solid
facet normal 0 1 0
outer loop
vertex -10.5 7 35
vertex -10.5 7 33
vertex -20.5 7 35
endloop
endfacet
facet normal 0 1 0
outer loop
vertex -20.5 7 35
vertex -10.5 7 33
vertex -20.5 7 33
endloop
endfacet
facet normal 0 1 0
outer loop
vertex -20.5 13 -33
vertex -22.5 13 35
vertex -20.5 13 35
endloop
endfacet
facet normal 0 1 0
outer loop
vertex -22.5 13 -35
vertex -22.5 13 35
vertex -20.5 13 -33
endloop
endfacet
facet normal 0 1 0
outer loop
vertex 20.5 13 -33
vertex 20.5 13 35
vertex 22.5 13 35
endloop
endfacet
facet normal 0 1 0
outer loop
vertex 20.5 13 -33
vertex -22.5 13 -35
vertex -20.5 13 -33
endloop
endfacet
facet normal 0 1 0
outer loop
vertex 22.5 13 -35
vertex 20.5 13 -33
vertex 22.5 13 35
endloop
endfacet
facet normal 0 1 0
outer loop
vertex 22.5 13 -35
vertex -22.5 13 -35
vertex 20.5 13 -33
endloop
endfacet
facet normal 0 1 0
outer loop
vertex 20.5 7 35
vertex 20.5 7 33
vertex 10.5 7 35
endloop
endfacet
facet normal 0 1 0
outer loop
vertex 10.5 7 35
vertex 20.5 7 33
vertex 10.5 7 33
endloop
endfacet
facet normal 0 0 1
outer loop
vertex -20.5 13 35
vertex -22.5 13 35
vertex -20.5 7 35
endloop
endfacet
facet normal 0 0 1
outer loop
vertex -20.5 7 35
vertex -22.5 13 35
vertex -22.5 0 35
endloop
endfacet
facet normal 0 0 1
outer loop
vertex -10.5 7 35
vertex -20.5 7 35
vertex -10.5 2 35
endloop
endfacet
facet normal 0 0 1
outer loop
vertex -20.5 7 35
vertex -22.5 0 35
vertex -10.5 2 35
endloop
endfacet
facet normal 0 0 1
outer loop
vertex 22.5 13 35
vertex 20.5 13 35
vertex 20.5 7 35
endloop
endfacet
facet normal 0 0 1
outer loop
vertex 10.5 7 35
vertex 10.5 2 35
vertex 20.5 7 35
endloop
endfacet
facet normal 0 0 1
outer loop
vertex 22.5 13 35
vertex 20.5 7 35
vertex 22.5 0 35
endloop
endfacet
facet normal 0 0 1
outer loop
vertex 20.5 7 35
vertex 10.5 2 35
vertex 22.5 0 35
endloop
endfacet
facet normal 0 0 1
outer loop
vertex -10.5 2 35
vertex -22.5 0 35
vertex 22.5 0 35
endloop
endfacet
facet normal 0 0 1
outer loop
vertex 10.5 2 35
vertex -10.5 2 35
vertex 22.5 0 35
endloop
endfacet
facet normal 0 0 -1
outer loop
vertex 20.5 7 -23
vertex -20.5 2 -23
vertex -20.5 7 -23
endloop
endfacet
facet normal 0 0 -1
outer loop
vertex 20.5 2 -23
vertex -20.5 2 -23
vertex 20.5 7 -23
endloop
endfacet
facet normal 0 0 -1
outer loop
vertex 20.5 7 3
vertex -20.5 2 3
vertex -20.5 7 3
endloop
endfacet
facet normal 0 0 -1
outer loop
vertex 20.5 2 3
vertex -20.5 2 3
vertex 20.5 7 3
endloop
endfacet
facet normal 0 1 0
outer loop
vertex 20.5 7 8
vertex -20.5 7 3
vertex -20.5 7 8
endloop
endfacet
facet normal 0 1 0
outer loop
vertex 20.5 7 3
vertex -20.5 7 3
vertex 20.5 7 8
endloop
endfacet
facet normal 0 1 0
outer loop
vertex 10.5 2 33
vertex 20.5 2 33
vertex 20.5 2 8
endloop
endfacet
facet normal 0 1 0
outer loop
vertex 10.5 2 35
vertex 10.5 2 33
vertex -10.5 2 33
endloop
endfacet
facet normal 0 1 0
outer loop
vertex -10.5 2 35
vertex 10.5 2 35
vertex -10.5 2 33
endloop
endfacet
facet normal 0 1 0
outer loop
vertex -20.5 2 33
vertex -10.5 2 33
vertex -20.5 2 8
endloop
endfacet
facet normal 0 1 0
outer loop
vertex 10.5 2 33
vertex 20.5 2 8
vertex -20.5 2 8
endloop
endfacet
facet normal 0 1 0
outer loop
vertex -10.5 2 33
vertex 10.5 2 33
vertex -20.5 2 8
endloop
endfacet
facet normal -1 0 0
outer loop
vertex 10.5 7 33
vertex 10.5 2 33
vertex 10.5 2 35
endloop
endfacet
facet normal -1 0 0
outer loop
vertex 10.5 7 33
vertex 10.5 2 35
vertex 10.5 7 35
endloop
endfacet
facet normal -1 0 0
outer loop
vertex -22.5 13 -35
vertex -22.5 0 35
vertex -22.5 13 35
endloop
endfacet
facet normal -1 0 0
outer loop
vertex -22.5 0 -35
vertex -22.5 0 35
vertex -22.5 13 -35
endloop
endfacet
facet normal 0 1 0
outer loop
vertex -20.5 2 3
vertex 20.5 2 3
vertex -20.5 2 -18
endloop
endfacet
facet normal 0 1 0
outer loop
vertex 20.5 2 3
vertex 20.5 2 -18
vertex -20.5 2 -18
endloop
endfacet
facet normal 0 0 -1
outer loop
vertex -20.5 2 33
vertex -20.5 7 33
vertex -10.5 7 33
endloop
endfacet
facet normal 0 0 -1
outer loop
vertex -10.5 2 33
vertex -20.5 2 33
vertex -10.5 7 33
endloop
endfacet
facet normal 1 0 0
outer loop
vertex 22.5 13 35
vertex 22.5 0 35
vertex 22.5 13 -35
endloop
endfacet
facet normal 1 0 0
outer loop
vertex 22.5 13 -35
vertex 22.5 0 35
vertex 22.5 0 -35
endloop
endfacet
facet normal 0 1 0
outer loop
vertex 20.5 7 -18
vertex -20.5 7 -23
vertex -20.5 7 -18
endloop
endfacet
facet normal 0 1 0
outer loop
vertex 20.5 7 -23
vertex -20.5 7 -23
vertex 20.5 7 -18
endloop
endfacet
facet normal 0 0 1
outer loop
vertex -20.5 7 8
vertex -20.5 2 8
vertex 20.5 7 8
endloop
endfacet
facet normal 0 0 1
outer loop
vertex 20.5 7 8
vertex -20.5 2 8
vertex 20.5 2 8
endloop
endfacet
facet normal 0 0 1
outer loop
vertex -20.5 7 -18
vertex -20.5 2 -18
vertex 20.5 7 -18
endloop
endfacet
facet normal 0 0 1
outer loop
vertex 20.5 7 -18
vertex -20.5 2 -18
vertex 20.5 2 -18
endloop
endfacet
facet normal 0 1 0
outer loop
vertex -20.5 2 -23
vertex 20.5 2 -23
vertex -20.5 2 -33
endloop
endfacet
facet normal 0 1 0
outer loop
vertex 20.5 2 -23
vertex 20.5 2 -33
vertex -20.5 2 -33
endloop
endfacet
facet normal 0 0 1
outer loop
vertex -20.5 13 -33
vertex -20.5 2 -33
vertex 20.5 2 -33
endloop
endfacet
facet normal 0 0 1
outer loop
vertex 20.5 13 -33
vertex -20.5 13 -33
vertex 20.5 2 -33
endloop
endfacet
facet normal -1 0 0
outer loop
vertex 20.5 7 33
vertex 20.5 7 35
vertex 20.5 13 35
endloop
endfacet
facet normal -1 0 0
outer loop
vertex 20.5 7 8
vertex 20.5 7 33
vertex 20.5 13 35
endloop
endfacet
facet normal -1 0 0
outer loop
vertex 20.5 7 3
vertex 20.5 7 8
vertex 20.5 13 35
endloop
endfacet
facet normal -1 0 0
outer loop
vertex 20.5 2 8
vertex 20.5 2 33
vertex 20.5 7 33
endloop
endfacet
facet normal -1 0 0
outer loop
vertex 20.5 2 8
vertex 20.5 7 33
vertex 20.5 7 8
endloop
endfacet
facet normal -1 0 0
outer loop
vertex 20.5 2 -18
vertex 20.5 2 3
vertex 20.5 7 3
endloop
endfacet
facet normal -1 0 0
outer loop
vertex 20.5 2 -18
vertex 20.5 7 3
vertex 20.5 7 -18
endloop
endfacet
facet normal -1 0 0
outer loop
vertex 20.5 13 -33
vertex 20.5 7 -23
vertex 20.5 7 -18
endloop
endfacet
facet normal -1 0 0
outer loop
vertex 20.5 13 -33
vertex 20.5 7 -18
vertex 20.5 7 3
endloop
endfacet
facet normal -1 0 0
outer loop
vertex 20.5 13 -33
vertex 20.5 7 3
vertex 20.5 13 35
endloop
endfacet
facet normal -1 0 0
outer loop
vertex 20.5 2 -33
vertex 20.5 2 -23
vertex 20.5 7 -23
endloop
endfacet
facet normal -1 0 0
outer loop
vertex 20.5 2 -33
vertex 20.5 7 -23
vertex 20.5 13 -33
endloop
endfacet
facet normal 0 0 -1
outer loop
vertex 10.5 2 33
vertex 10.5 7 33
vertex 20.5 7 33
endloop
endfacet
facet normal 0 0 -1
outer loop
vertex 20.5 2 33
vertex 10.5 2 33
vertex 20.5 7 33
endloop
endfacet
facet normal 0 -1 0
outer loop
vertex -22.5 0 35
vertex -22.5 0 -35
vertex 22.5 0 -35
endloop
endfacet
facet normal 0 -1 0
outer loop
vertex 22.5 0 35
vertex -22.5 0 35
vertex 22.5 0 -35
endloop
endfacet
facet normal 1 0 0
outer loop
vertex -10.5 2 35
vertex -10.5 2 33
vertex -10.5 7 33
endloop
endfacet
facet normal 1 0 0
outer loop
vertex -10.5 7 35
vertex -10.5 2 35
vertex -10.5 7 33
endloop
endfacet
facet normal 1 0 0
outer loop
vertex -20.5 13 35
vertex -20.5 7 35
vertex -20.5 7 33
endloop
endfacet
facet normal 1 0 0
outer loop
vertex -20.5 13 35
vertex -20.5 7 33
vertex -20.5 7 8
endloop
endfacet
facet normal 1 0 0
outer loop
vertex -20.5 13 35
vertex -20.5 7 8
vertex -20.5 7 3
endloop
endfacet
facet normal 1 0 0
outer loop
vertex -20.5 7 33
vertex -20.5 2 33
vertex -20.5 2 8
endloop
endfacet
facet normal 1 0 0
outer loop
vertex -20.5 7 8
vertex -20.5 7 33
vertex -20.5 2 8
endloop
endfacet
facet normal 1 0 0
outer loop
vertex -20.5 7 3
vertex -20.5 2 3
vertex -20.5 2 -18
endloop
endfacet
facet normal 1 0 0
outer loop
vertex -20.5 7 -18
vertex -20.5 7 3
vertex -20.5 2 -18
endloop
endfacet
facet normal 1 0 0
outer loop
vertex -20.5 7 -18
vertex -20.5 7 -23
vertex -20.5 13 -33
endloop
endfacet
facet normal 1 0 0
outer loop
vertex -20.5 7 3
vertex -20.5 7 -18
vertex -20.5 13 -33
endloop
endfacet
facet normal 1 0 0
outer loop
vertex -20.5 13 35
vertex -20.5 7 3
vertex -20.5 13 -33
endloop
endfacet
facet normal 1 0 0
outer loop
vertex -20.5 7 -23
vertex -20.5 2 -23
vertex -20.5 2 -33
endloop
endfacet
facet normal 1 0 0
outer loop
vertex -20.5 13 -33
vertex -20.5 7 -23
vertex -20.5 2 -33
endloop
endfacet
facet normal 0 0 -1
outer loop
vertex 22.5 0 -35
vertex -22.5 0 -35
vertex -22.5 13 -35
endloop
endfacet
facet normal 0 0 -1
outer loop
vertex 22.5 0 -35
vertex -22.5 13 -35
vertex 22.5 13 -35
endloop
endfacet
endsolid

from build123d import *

# Parameters (mm, degrees)
SKETCH1_W               = 45
SKETCH1_H               = 70
BOSS_EXTRUDE1_DEPTH     = 10
SKETCH2_W               = 41
SKETCH2_H               = 66
CUT_EXTRUDE1_DEPTH      = 8
SKETCH7_W               = 41
SKETCH7_H               = 3
CUT_EXTRUDE2_DEPTH      = 1
CUT_EXTRUDE2_DEPTH_BACK = 81
SKETCH8_W               = 21
SKETCH8_H               = 5
CUT_EXTRUDE3_DEPTH      = 42
SKETCH9_W               = 41
SKETCH9_H               = 5
BOSS_EXTRUDE3_DEPTH     = 5
SKETCH10_W              = 41
SKETCH10_H              = 5
BOSS_EXTRUDE4_DEPTH     = 5
SKETCH13_W              = 2
SKETCH13_H              = 70
BOSS_EXTRUDE5_DEPTH     = 3
SKETCH14_W              = 41
SKETCH14_H              = 2
BOSS_EXTRUDE6_DEPTH     = 3
SKETCH15_W              = 2
SKETCH15_H              = 70
BOSS_EXTRUDE7_DEPTH     = 3


with BuildPart() as part:
    # Sketch1 → Boss-Extrude1 (new body)
    with BuildSketch(Plane(origin=(0, 0, 0), x_dir=(1, 0, 0), z_dir=(0, 1, 0))):
        Rectangle(SKETCH1_W, SKETCH1_H)
    extrude(amount=BOSS_EXTRUDE1_DEPTH)

    # Sketch2 → Cut-Extrude1 (cut)
    with BuildSketch(Plane(origin=(0, 10, 0), x_dir=(1, 0, 0), z_dir=(0, 1, 0))):
        Rectangle(SKETCH2_W, SKETCH2_H)
    extrude(amount=-CUT_EXTRUDE1_DEPTH, mode=Mode.SUBTRACT)

    # Sketch7 → Cut-Extrude2 (cut, two sides)
    with BuildSketch(Plane(origin=(0, 0, 33), x_dir=(-1, 0, 0), z_dir=(0, 0, -1))) as cut_extrude2_sk:
        with Locations((0, 8.5)):
            Rectangle(SKETCH7_W, SKETCH7_H)
    extrude(amount=CUT_EXTRUDE2_DEPTH, mode=Mode.SUBTRACT)
    extrude(cut_extrude2_sk.sketch, amount=-CUT_EXTRUDE2_DEPTH_BACK, mode=Mode.SUBTRACT)

    # Sketch8 → Cut-Extrude3 (cut)
    with BuildSketch(Plane(origin=(0, 0, 33), x_dir=(-1, 0, 0), z_dir=(0, 0, -1))):
        with Locations((0, 4.5)):
            Rectangle(SKETCH8_W, SKETCH8_H)
    extrude(amount=-CUT_EXTRUDE3_DEPTH, mode=Mode.SUBTRACT)

    # Sketch9 → Boss-Extrude3 (add)
    with BuildSketch(Plane(origin=(0, 2, 0), x_dir=(1, 0, 0), z_dir=(0, 1, 0))):
        with Locations((0, -5.5)):
            Rectangle(SKETCH9_W, SKETCH9_H)
    extrude(amount=BOSS_EXTRUDE3_DEPTH)

    # Sketch10 → Boss-Extrude4 (add)
    with BuildSketch(Plane(origin=(0, 2, 0), x_dir=(1, 0, 0), z_dir=(0, 1, 0))):
        with Locations((0, 20.5)):
            Rectangle(SKETCH10_W, SKETCH10_H)
    extrude(amount=BOSS_EXTRUDE4_DEPTH)

    # Sketch13 → Boss-Extrude5 (add)
    with BuildSketch(Plane(origin=(0, 10, 0), x_dir=(1, 0, 0), z_dir=(0, 1, 0))):
        with Locations((-21.5, 0)):
            Rectangle(SKETCH13_W, SKETCH13_H)
    extrude(amount=BOSS_EXTRUDE5_DEPTH)

    # Sketch14 → Boss-Extrude6 (add)
    with BuildSketch(Plane(origin=(0, 10, 0), x_dir=(1, 0, 0), z_dir=(0, 1, 0))):
        with Locations((0, 34)):
            Rectangle(SKETCH14_W, SKETCH14_H)
    extrude(amount=BOSS_EXTRUDE6_DEPTH)

    # Sketch15 → Boss-Extrude7 (add)
    with BuildSketch(Plane(origin=(0, 10, 0), x_dir=(1, 0, 0), z_dir=(0, 1, 0))):
        with Locations((21.5, 0)):
            Rectangle(SKETCH15_W, SKETCH15_H)
    extrude(amount=BOSS_EXTRUDE7_DEPTH)


solid = part.part
